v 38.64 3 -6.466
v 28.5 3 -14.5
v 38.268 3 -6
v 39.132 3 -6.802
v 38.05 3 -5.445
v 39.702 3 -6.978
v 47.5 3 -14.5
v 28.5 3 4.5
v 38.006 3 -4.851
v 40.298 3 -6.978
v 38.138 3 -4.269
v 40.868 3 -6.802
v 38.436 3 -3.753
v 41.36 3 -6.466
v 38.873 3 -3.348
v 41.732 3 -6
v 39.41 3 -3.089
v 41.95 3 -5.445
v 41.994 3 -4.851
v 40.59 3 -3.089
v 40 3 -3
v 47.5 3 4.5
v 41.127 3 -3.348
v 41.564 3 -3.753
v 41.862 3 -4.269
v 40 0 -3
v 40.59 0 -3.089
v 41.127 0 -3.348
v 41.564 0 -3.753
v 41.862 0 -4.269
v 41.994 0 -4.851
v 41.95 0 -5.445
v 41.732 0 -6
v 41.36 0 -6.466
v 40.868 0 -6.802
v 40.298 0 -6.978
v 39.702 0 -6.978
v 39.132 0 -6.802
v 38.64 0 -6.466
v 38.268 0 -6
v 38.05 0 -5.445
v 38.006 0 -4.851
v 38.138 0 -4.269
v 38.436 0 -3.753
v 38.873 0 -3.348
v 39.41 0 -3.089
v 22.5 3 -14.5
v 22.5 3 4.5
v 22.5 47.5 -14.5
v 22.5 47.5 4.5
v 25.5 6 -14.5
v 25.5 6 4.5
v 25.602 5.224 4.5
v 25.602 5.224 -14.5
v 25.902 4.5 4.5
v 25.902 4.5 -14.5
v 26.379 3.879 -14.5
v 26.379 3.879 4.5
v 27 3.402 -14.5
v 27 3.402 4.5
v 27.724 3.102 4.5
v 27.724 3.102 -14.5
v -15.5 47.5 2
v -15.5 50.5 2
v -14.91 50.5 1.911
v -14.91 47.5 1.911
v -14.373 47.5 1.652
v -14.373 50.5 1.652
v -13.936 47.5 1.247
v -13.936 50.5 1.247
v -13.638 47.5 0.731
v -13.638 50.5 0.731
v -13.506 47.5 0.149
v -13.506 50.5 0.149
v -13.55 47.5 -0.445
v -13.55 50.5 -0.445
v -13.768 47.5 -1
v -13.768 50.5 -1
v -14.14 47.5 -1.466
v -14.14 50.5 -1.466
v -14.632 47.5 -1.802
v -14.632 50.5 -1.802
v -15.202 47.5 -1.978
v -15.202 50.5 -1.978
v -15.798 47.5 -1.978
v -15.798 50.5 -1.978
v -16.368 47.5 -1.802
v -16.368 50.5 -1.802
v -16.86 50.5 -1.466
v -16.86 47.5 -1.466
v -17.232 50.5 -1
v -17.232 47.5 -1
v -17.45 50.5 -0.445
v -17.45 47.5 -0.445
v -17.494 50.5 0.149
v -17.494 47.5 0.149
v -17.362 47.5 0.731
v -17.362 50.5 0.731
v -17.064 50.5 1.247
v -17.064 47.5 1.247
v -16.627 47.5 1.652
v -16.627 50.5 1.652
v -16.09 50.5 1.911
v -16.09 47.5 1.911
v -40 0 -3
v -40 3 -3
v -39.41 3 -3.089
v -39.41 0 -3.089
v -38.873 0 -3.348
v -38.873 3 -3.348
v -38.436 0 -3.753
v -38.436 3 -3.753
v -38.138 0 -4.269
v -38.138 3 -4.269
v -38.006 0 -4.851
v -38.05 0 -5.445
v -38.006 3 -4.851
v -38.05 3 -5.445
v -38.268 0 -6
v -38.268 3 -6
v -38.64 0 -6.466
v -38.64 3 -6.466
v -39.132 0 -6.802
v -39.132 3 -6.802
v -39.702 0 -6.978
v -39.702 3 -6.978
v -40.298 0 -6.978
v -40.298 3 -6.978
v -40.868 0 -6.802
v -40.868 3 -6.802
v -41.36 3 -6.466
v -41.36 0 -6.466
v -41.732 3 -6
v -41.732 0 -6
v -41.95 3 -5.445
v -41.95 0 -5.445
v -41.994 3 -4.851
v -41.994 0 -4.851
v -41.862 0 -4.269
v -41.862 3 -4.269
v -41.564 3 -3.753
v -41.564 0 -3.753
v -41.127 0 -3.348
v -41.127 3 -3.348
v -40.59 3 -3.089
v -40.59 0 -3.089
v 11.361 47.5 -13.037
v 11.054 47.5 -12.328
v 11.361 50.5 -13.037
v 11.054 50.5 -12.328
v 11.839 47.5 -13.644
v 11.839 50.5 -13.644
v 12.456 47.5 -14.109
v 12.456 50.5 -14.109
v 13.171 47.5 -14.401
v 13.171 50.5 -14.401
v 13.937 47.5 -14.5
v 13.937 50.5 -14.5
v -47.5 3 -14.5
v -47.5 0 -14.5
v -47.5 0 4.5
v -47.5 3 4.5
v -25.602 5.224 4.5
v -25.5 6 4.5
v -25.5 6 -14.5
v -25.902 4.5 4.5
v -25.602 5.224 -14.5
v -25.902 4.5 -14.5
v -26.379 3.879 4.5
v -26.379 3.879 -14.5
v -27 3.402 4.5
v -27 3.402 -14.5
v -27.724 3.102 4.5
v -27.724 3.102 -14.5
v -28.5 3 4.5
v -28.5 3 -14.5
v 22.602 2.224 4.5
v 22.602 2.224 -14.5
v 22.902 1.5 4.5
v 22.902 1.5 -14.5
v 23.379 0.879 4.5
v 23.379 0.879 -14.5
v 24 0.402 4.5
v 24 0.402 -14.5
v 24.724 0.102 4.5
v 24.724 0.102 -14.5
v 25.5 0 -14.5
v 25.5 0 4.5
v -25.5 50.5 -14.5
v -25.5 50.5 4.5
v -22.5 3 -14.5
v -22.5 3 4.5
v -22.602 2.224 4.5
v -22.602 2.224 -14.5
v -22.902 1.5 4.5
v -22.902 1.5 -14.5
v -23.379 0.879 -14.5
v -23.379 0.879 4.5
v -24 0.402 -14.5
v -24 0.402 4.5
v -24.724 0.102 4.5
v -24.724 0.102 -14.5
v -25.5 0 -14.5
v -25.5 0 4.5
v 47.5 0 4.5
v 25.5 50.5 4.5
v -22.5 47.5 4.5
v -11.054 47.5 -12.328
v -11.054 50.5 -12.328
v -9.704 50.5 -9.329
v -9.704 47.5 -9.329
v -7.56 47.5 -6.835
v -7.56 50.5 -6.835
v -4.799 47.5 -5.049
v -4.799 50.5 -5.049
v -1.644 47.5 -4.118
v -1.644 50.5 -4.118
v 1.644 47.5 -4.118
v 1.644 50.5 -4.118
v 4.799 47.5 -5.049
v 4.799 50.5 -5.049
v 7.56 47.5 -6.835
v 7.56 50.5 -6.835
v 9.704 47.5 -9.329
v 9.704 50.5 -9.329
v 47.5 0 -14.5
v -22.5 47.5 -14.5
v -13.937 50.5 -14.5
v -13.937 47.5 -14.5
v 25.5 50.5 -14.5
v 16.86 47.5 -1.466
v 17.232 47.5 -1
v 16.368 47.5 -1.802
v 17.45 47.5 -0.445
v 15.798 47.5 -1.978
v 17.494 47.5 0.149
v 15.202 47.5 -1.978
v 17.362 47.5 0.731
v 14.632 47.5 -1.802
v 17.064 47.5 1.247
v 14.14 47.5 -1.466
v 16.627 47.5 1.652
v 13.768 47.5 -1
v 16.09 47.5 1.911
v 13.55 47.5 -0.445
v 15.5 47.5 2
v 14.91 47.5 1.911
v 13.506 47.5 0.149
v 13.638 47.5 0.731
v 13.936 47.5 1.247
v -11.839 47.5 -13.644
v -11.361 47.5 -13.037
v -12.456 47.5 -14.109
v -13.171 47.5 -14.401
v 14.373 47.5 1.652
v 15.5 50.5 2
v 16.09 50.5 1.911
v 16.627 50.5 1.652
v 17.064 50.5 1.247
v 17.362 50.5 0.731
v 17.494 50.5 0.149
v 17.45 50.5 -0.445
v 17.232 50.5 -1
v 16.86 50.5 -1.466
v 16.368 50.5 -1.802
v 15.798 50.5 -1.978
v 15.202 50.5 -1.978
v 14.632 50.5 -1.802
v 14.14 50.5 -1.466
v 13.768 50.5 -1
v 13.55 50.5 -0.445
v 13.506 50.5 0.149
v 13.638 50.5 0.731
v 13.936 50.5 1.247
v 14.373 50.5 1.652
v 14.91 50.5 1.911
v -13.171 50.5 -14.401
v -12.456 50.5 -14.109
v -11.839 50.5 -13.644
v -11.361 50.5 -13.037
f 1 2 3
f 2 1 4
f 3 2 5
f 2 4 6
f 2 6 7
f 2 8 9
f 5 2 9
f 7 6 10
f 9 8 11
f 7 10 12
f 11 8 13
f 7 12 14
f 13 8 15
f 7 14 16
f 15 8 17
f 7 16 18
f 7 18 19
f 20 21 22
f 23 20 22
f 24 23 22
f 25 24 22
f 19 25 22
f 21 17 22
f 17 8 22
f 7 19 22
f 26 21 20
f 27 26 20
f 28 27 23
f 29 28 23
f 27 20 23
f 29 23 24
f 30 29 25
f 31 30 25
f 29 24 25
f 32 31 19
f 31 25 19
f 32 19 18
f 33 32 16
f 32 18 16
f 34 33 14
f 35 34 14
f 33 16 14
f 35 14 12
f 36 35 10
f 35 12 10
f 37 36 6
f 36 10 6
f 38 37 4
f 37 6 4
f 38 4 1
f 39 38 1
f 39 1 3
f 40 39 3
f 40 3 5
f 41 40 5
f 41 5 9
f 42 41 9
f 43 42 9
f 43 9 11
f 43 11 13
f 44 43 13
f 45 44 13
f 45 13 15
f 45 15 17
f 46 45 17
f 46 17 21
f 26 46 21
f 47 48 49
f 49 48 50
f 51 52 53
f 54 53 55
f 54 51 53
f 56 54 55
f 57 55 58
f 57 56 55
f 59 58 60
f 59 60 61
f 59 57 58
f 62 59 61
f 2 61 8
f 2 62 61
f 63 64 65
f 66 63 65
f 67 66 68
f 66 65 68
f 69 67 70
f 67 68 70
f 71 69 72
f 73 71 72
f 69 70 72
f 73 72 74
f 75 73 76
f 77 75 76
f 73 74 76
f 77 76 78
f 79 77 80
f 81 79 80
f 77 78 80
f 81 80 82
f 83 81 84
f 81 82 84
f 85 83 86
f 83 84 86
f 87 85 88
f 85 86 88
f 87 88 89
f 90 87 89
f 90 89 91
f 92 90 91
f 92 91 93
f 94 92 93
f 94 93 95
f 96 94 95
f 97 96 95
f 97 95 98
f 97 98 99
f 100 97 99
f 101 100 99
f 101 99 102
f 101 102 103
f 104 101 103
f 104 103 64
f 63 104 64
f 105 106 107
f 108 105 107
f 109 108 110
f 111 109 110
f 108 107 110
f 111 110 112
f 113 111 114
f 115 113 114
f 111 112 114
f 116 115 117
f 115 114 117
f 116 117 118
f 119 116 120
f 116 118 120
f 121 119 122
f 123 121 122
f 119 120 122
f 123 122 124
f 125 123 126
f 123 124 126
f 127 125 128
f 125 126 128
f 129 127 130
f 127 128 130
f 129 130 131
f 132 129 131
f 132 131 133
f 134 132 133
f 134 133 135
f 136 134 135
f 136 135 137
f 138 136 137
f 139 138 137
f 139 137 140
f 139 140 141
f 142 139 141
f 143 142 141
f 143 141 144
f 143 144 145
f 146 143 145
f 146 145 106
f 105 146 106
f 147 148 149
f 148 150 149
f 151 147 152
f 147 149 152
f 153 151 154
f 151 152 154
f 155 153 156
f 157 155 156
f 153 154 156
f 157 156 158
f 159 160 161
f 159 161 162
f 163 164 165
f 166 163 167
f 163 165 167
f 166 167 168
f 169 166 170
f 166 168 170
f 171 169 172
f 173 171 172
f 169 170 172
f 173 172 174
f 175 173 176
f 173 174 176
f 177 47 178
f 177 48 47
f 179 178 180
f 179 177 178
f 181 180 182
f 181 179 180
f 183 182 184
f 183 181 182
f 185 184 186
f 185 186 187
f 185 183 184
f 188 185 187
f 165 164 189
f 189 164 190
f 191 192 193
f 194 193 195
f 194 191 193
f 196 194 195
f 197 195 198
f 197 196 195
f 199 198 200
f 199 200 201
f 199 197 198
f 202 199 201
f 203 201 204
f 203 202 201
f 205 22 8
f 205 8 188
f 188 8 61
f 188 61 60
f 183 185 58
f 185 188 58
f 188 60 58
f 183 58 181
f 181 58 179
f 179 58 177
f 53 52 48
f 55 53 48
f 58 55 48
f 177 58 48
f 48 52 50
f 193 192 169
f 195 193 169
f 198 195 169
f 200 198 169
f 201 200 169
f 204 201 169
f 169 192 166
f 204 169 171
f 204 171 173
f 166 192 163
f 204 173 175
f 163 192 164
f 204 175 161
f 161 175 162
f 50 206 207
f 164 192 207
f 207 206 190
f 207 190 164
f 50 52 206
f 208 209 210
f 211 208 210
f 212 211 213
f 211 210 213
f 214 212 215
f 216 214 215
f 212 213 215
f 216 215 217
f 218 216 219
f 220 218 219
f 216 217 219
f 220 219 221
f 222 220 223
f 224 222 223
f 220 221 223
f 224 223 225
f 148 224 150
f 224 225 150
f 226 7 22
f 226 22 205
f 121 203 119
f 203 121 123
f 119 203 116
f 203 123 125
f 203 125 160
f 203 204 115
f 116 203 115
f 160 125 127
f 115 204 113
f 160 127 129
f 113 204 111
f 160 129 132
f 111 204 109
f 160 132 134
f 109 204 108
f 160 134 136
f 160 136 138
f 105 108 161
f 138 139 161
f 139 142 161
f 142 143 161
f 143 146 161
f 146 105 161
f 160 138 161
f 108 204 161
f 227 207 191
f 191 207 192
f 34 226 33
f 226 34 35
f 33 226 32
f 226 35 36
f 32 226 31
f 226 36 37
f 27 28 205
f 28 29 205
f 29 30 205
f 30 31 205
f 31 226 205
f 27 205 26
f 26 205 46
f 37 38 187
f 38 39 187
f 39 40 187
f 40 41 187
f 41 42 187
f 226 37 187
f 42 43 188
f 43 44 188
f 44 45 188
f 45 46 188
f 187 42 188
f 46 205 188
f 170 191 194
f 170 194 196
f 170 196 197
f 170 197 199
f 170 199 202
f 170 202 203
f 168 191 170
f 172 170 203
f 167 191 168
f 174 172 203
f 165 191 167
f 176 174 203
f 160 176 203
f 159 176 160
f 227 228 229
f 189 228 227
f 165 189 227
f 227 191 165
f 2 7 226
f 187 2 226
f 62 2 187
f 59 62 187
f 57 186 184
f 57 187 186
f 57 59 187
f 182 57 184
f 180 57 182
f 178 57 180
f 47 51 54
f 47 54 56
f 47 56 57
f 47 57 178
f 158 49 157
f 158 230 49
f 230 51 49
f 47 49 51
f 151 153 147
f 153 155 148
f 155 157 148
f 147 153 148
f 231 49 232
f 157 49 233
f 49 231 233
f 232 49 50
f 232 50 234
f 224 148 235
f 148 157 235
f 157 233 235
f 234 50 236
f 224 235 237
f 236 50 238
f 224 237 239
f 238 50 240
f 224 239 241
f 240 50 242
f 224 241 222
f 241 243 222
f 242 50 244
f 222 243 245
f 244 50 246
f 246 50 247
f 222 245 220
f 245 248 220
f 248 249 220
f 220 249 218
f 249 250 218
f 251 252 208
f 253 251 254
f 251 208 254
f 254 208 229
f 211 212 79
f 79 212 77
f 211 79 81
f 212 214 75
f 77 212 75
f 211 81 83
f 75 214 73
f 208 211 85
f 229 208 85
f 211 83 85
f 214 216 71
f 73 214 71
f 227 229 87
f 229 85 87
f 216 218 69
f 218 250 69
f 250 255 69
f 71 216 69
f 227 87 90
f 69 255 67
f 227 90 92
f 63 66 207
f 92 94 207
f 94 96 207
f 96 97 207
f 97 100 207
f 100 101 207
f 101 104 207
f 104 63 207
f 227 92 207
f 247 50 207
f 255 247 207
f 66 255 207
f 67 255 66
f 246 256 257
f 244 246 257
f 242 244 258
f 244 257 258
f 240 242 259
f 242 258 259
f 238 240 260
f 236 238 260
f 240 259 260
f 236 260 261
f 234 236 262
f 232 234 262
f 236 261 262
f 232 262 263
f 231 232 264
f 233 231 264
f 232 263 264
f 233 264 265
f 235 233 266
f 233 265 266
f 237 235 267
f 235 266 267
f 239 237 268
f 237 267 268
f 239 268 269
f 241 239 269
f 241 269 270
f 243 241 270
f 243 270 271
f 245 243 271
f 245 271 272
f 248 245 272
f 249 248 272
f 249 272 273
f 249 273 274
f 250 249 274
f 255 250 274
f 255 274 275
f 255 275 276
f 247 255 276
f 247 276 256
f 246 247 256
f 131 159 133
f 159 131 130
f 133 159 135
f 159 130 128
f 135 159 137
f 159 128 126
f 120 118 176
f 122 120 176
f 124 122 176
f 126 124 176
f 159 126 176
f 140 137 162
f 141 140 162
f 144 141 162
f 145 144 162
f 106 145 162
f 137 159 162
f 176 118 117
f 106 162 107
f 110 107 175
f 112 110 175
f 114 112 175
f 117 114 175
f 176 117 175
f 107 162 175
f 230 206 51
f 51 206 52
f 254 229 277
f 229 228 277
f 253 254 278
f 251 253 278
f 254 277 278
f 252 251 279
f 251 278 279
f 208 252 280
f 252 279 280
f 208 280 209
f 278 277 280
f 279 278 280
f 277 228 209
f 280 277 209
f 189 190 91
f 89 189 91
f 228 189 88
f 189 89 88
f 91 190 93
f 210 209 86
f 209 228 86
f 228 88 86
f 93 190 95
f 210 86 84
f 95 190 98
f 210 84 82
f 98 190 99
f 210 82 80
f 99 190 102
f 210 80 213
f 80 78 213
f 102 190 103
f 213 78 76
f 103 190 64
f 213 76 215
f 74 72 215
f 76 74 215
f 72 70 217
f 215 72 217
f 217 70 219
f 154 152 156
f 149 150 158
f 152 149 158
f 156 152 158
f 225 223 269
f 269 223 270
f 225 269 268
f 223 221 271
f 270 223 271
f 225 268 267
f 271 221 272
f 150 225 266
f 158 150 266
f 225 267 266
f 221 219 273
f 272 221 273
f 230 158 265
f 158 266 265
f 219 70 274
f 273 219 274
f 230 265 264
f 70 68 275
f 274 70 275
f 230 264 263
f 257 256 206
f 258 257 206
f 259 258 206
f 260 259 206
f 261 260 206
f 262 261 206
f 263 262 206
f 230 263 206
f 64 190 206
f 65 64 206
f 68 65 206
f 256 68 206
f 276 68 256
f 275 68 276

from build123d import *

# Parameters (mm, degrees)
EXTRUDE_THIN1_DEPTH = 4.5
SKETCH2_R           = 2
CUT_EXTRUDE1_DEPTH  = 70.474815581
BOSS_EXTRUDE1_DEPTH = 10
SKETCH4_R           = 11.5
CUT_EXTRUDE2_DEPTH  = 71.829019476
FILLET1_R           = 3
FILLET2_R           = 3
SKETCH5_R           = 2
CUT_EXTRUDE3_DEPTH  = 69.722267134


with BuildPart() as part:
    # Sketch1 → Extrude-Thin1 (new, symmetric)
    with BuildSketch(Plane.XY):
        Polygon((-47.5, 0), (-22.5, 0), (-22.5, 47.5), (0, 47.5), (0, 50.5), (-25.5, 50.5), (-25.5, 3), (-47.5, 3), align=None)
    extrude_thin1 = extrude(amount=EXTRUDE_THIN1_DEPTH, both=True)

    # Mirror1: Extrude-Thin1 across plane
    add(extrude_thin1.mirror(Plane(origin=(0, 50.5, 4.5), x_dir=(0, 0, 1), z_dir=(1, 0, 0))))

    # Sketch2 → Cut-Extrude1 (cut, through all)
    with BuildSketch(Plane(origin=(0, 50.5, 0), x_dir=(1, 0, 0), z_dir=(0, 1, 0))):
        with Locations(Location((-15.5, 0, 0), (0, 0, 270))):
            Circle(SKETCH2_R)
        with Locations(Location((15.5, 0, 0), (0, 0, 270))):
            Circle(SKETCH2_R)
    extrude(amount=-CUT_EXTRUDE1_DEPTH, mode=Mode.SUBTRACT)

    # Sketch3 → Boss-Extrude1 (add)
    with BuildSketch(Plane(origin=(0, 0, -4.5), x_dir=(-1, 0, 0), z_dir=(0, 0, -1))):
        Polygon((-22.5, 47.5), (22.5, 47.5), (22.5, 0), (47.5, 0), (47.5, 3), (25.5, 3), (25.5, 50.5), (-25.5, 50.5), (-25.5, 3), (-47.5, 3), (-47.5, 0), (-22.5, 0), align=None)
    extrude(amount=BOSS_EXTRUDE1_DEPTH)

    # Sketch4 → Cut-Extrude2 (cut, through all)
    with BuildSketch(Plane(origin=(0, 50.5, 0), x_dir=(1, 0, 0), z_dir=(0, 1, 0))):
        with Locations((0, 15.5)):
            Circle(SKETCH4_R)
    extrude(amount=-CUT_EXTRUDE2_DEPTH, mode=Mode.SUBTRACT)

    # Fillet1
    fillet1_edges = [part.edges().sort_by_distance(p)[0] for p in [
        (-11.456439237, 49, -14.5),
        (11.456439237, 49, -14.5),
    ]]
    fillet(fillet1_edges, radius=FILLET1_R)

    # Fillet2
    fillet2_edges = [part.edges().sort_by_distance(p)[0] for p in [
        (-22.5, 0, -5),
        (-25.5, 3, -5),
        (22.5, 0, -5),
        (25.5, 3, -5),
    ]]
    fillet(fillet2_edges, radius=FILLET2_R)

    # Sketch5 → Cut-Extrude3 (cut, through all)
    with BuildSketch(Plane(origin=(0, 3, 0), x_dir=(1, 0, 0), z_dir=(0, 1, 0))):
        with Locations(Location((-40, 5, 0), (0, 0, 270))):
            Circle(SKETCH5_R)
        with Locations(Location((40, 5, 0), (0, 0, 270))):
            Circle(SKETCH5_R)
    extrude(amount=-CUT_EXTRUDE3_DEPTH, mode=Mode.SUBTRACT)


solid = part.part
